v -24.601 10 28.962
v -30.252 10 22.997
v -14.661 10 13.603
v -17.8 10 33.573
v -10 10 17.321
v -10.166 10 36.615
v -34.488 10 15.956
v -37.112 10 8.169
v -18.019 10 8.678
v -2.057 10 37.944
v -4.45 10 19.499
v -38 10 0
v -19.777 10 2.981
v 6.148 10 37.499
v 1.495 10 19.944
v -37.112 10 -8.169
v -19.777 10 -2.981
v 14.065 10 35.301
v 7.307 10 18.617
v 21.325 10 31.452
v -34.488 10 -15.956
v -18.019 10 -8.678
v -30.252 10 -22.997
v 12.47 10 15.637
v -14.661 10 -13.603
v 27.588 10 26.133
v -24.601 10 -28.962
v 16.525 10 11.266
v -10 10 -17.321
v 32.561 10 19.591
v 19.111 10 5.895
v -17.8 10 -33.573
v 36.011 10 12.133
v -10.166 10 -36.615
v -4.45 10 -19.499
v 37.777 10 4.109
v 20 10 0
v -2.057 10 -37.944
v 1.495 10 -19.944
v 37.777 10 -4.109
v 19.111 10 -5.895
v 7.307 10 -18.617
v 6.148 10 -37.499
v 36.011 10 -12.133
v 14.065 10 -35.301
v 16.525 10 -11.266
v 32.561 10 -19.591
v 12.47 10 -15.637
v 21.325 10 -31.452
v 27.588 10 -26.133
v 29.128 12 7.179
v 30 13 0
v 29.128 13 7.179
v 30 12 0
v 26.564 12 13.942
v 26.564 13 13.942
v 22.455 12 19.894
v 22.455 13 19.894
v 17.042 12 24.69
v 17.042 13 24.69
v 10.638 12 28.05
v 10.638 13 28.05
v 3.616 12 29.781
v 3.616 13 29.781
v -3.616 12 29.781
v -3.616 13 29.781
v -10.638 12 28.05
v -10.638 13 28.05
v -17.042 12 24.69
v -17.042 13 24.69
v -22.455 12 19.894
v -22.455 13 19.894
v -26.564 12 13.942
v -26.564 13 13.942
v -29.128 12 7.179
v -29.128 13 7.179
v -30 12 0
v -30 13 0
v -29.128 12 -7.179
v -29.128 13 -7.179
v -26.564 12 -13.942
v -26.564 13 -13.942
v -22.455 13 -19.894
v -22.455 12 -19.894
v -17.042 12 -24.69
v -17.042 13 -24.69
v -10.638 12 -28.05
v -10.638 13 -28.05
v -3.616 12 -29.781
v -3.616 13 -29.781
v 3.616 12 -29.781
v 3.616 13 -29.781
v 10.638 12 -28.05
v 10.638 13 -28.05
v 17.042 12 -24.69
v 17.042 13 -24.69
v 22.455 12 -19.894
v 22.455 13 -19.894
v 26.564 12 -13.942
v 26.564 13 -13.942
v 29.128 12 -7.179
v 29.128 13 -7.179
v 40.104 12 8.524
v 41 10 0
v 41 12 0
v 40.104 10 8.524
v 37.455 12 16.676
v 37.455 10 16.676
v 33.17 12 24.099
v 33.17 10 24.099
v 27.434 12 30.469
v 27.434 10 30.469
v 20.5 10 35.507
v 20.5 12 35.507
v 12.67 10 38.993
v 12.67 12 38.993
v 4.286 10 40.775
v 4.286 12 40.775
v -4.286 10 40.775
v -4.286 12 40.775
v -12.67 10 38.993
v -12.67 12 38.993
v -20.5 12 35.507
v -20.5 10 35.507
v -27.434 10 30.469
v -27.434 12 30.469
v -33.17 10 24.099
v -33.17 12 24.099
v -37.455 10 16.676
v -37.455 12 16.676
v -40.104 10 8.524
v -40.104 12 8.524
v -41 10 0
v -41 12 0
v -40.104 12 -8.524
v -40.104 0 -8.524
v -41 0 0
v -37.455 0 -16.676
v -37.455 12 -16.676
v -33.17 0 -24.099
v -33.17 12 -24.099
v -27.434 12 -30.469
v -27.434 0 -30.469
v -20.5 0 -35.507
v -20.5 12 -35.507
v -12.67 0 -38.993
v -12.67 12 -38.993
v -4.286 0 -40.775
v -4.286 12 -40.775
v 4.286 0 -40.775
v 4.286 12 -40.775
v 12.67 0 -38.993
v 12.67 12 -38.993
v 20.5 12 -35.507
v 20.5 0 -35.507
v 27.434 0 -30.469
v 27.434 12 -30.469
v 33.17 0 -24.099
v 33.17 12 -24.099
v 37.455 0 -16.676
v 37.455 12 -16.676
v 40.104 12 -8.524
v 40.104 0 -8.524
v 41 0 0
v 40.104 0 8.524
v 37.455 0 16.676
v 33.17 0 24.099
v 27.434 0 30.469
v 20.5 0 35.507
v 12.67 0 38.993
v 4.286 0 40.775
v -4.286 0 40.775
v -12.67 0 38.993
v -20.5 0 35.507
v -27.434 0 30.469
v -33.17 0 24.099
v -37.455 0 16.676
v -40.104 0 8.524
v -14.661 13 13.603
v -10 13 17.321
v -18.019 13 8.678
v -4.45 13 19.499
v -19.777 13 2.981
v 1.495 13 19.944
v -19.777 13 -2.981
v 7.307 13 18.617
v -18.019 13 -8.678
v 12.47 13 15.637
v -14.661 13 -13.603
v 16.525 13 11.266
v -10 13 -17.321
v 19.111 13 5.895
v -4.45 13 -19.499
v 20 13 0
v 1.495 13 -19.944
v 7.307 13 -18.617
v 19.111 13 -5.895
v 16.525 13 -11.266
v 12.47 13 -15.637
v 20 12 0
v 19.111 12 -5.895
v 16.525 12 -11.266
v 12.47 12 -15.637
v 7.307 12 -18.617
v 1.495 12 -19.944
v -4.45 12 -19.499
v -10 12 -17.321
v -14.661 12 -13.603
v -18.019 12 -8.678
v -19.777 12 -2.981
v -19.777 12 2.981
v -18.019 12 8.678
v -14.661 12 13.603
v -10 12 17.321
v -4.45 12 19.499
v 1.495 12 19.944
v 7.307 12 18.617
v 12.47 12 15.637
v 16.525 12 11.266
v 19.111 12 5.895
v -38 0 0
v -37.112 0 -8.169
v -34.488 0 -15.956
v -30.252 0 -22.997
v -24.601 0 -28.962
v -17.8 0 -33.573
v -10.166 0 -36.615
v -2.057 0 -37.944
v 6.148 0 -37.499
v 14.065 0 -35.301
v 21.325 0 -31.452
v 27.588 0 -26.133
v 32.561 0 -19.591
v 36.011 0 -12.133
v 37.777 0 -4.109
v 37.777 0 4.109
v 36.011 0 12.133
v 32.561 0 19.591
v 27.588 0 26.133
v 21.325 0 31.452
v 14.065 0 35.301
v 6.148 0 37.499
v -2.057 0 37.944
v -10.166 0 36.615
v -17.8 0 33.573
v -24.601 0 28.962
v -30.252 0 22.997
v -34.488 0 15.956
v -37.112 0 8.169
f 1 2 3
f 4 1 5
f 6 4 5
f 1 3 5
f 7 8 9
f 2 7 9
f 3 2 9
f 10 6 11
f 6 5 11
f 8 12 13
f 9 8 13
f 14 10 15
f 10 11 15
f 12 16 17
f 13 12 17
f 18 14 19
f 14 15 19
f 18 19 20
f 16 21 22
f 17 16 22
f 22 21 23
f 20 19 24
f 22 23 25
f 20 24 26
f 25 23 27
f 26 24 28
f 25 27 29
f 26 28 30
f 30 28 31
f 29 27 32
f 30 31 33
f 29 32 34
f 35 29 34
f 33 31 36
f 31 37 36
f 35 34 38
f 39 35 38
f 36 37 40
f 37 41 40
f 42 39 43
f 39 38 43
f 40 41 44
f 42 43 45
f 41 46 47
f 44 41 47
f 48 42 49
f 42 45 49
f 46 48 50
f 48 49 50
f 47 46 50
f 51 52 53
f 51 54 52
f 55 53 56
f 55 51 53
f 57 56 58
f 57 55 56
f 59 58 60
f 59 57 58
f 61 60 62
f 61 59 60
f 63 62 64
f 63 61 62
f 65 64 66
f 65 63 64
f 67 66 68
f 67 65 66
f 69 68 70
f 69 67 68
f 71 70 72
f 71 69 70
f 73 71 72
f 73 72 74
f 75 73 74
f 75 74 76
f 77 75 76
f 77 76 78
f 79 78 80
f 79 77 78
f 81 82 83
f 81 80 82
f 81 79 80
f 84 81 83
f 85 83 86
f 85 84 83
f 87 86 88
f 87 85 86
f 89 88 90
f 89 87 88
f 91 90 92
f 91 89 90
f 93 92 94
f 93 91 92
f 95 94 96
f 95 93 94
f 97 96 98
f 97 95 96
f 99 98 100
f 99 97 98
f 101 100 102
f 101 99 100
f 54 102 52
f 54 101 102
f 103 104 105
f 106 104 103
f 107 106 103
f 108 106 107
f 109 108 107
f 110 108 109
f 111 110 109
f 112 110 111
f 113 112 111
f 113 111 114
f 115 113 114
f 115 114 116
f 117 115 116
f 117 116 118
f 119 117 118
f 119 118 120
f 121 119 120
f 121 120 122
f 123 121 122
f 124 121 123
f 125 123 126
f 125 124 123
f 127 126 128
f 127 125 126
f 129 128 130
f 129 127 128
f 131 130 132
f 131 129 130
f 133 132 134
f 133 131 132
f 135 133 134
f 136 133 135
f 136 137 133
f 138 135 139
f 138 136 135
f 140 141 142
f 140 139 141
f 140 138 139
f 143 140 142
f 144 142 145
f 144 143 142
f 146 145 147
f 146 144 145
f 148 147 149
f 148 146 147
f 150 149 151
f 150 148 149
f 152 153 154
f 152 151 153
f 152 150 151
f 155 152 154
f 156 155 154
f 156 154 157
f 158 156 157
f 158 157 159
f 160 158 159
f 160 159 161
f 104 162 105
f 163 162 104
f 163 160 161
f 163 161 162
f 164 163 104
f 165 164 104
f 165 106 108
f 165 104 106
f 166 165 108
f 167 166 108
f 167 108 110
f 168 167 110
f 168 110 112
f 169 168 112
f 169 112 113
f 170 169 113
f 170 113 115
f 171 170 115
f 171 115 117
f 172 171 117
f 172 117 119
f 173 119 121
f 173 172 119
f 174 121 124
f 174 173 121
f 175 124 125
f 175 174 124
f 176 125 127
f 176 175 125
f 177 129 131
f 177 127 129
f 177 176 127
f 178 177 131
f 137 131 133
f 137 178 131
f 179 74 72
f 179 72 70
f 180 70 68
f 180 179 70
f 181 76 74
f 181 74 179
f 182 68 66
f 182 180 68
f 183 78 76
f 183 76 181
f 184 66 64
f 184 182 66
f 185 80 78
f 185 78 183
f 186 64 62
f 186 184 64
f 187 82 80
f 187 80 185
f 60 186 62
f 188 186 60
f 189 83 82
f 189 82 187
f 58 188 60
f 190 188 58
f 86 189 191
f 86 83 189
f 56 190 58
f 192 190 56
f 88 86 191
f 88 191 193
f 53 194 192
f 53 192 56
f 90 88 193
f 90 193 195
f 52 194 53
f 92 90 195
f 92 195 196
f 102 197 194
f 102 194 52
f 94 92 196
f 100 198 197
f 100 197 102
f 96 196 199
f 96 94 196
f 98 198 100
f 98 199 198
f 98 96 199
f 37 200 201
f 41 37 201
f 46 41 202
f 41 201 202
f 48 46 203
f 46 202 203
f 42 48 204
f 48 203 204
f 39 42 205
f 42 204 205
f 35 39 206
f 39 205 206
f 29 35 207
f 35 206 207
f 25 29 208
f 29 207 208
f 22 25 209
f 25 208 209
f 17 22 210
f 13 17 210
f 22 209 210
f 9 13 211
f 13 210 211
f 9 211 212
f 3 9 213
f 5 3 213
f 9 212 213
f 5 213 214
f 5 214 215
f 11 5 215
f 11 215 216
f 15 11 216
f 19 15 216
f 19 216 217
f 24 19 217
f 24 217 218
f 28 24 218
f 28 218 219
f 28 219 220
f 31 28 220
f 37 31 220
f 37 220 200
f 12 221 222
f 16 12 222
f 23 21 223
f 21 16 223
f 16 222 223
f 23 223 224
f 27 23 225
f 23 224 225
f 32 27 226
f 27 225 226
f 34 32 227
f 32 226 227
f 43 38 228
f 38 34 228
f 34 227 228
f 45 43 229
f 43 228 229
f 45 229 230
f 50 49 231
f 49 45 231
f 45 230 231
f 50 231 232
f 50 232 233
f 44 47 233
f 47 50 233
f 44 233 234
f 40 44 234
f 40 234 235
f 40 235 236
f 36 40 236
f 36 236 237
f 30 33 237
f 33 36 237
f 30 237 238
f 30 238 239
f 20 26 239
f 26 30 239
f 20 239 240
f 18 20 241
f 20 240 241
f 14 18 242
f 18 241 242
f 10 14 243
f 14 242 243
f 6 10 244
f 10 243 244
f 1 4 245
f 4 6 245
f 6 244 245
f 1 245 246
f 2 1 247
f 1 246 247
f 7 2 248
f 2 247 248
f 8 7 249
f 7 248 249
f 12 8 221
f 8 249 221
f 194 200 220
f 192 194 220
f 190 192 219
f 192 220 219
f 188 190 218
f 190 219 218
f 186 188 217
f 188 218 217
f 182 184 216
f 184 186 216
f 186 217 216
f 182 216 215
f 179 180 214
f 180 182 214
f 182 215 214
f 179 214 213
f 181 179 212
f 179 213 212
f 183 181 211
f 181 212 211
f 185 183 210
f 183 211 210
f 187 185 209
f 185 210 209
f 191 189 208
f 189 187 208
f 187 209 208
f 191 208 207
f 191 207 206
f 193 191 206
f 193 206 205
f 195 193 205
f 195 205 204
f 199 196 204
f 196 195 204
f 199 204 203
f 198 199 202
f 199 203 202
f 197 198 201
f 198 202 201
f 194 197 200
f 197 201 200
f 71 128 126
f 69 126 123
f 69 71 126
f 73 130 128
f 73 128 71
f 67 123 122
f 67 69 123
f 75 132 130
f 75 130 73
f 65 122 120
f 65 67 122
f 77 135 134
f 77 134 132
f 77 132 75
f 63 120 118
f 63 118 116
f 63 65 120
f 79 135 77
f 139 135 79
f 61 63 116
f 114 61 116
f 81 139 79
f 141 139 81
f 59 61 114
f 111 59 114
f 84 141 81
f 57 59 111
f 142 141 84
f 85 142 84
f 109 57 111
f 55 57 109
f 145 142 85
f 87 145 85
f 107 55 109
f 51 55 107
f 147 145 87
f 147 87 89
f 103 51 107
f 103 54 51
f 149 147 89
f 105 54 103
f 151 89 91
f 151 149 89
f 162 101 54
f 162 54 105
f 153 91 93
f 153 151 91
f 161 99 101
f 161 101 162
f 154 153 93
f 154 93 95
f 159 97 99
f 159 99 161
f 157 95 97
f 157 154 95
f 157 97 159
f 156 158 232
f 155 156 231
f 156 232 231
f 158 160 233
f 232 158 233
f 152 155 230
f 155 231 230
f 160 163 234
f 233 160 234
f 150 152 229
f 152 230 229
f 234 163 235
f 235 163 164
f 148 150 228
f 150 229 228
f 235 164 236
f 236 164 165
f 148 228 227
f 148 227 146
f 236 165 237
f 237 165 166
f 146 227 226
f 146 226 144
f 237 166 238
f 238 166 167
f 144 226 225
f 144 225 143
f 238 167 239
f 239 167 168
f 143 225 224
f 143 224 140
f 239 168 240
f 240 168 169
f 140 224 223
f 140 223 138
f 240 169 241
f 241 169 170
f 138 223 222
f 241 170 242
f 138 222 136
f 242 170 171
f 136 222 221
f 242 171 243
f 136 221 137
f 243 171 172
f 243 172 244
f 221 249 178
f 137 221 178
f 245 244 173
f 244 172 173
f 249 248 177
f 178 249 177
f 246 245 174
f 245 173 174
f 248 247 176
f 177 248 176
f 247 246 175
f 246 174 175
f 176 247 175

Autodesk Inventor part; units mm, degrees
ref_plane "YZ Plane" through (0, 0, 0) normal (1, 0, 0) x (0, 1, 0)
ref_plane "XZ Plane" through (0, 0, 0) normal (0, 1, 0) x (-1, 0, 0)
ref_plane "XY Plane" through (0, 0, 0) normal (0, 0, 1) x (1, 0, 0)
sketch "スケッチ1" plane through (0, 0, 0) normal (0, 1, 0) x (-1, 0, 0)
  circle A0 centre (0, 0) radius 38
  circle A1 centre (0, 0) radius 41
  dimension "d0" = 76
  dimension "d1" = 82
extrude "押し出し1" add sketch "スケッチ1" along normal blind 10
sketch "スケッチ2" plane through (0, 10, 0) normal (0, 1, 0) x (1, 0, 0)
  circle A0 centre (0, 0) radius 41 projected
extrude "押し出し2" add sketch "スケッチ2" along normal blind 2
sketch "スケッチ3" plane through (0, 12, 0) normal (0, 1, 0) x (1, 0, 0)
  circle A0 centre (0, 0) radius 41 projected
sketch "スケッチ4" plane through (0, 12, 0) normal (0, 1, 0) x (1, 0, 0)
  circle A0 centre (0, 0) radius 41 projected
  circle A1 centre (0, 0) radius 20
  dimension "d6" = 40
extrude "押し出し3" cut sketch "スケッチ4" against normal blind 10 contours A1
sketch "スケッチ5" plane through (0, 12, 0) normal (0, 1, 0) x (1, 0, 0)
  circle A0 centre (0, 0) radius 20 projected
  circle A1 centre (0, 0) radius 41 projected
  circle A2 centre (0, 0) radius 30
  dimension "d9" = 60
extrude "押し出し4" add sketch "スケッチ5" along normal blind 1 contours A2
properties part number "知能ロボコン大砲３"
